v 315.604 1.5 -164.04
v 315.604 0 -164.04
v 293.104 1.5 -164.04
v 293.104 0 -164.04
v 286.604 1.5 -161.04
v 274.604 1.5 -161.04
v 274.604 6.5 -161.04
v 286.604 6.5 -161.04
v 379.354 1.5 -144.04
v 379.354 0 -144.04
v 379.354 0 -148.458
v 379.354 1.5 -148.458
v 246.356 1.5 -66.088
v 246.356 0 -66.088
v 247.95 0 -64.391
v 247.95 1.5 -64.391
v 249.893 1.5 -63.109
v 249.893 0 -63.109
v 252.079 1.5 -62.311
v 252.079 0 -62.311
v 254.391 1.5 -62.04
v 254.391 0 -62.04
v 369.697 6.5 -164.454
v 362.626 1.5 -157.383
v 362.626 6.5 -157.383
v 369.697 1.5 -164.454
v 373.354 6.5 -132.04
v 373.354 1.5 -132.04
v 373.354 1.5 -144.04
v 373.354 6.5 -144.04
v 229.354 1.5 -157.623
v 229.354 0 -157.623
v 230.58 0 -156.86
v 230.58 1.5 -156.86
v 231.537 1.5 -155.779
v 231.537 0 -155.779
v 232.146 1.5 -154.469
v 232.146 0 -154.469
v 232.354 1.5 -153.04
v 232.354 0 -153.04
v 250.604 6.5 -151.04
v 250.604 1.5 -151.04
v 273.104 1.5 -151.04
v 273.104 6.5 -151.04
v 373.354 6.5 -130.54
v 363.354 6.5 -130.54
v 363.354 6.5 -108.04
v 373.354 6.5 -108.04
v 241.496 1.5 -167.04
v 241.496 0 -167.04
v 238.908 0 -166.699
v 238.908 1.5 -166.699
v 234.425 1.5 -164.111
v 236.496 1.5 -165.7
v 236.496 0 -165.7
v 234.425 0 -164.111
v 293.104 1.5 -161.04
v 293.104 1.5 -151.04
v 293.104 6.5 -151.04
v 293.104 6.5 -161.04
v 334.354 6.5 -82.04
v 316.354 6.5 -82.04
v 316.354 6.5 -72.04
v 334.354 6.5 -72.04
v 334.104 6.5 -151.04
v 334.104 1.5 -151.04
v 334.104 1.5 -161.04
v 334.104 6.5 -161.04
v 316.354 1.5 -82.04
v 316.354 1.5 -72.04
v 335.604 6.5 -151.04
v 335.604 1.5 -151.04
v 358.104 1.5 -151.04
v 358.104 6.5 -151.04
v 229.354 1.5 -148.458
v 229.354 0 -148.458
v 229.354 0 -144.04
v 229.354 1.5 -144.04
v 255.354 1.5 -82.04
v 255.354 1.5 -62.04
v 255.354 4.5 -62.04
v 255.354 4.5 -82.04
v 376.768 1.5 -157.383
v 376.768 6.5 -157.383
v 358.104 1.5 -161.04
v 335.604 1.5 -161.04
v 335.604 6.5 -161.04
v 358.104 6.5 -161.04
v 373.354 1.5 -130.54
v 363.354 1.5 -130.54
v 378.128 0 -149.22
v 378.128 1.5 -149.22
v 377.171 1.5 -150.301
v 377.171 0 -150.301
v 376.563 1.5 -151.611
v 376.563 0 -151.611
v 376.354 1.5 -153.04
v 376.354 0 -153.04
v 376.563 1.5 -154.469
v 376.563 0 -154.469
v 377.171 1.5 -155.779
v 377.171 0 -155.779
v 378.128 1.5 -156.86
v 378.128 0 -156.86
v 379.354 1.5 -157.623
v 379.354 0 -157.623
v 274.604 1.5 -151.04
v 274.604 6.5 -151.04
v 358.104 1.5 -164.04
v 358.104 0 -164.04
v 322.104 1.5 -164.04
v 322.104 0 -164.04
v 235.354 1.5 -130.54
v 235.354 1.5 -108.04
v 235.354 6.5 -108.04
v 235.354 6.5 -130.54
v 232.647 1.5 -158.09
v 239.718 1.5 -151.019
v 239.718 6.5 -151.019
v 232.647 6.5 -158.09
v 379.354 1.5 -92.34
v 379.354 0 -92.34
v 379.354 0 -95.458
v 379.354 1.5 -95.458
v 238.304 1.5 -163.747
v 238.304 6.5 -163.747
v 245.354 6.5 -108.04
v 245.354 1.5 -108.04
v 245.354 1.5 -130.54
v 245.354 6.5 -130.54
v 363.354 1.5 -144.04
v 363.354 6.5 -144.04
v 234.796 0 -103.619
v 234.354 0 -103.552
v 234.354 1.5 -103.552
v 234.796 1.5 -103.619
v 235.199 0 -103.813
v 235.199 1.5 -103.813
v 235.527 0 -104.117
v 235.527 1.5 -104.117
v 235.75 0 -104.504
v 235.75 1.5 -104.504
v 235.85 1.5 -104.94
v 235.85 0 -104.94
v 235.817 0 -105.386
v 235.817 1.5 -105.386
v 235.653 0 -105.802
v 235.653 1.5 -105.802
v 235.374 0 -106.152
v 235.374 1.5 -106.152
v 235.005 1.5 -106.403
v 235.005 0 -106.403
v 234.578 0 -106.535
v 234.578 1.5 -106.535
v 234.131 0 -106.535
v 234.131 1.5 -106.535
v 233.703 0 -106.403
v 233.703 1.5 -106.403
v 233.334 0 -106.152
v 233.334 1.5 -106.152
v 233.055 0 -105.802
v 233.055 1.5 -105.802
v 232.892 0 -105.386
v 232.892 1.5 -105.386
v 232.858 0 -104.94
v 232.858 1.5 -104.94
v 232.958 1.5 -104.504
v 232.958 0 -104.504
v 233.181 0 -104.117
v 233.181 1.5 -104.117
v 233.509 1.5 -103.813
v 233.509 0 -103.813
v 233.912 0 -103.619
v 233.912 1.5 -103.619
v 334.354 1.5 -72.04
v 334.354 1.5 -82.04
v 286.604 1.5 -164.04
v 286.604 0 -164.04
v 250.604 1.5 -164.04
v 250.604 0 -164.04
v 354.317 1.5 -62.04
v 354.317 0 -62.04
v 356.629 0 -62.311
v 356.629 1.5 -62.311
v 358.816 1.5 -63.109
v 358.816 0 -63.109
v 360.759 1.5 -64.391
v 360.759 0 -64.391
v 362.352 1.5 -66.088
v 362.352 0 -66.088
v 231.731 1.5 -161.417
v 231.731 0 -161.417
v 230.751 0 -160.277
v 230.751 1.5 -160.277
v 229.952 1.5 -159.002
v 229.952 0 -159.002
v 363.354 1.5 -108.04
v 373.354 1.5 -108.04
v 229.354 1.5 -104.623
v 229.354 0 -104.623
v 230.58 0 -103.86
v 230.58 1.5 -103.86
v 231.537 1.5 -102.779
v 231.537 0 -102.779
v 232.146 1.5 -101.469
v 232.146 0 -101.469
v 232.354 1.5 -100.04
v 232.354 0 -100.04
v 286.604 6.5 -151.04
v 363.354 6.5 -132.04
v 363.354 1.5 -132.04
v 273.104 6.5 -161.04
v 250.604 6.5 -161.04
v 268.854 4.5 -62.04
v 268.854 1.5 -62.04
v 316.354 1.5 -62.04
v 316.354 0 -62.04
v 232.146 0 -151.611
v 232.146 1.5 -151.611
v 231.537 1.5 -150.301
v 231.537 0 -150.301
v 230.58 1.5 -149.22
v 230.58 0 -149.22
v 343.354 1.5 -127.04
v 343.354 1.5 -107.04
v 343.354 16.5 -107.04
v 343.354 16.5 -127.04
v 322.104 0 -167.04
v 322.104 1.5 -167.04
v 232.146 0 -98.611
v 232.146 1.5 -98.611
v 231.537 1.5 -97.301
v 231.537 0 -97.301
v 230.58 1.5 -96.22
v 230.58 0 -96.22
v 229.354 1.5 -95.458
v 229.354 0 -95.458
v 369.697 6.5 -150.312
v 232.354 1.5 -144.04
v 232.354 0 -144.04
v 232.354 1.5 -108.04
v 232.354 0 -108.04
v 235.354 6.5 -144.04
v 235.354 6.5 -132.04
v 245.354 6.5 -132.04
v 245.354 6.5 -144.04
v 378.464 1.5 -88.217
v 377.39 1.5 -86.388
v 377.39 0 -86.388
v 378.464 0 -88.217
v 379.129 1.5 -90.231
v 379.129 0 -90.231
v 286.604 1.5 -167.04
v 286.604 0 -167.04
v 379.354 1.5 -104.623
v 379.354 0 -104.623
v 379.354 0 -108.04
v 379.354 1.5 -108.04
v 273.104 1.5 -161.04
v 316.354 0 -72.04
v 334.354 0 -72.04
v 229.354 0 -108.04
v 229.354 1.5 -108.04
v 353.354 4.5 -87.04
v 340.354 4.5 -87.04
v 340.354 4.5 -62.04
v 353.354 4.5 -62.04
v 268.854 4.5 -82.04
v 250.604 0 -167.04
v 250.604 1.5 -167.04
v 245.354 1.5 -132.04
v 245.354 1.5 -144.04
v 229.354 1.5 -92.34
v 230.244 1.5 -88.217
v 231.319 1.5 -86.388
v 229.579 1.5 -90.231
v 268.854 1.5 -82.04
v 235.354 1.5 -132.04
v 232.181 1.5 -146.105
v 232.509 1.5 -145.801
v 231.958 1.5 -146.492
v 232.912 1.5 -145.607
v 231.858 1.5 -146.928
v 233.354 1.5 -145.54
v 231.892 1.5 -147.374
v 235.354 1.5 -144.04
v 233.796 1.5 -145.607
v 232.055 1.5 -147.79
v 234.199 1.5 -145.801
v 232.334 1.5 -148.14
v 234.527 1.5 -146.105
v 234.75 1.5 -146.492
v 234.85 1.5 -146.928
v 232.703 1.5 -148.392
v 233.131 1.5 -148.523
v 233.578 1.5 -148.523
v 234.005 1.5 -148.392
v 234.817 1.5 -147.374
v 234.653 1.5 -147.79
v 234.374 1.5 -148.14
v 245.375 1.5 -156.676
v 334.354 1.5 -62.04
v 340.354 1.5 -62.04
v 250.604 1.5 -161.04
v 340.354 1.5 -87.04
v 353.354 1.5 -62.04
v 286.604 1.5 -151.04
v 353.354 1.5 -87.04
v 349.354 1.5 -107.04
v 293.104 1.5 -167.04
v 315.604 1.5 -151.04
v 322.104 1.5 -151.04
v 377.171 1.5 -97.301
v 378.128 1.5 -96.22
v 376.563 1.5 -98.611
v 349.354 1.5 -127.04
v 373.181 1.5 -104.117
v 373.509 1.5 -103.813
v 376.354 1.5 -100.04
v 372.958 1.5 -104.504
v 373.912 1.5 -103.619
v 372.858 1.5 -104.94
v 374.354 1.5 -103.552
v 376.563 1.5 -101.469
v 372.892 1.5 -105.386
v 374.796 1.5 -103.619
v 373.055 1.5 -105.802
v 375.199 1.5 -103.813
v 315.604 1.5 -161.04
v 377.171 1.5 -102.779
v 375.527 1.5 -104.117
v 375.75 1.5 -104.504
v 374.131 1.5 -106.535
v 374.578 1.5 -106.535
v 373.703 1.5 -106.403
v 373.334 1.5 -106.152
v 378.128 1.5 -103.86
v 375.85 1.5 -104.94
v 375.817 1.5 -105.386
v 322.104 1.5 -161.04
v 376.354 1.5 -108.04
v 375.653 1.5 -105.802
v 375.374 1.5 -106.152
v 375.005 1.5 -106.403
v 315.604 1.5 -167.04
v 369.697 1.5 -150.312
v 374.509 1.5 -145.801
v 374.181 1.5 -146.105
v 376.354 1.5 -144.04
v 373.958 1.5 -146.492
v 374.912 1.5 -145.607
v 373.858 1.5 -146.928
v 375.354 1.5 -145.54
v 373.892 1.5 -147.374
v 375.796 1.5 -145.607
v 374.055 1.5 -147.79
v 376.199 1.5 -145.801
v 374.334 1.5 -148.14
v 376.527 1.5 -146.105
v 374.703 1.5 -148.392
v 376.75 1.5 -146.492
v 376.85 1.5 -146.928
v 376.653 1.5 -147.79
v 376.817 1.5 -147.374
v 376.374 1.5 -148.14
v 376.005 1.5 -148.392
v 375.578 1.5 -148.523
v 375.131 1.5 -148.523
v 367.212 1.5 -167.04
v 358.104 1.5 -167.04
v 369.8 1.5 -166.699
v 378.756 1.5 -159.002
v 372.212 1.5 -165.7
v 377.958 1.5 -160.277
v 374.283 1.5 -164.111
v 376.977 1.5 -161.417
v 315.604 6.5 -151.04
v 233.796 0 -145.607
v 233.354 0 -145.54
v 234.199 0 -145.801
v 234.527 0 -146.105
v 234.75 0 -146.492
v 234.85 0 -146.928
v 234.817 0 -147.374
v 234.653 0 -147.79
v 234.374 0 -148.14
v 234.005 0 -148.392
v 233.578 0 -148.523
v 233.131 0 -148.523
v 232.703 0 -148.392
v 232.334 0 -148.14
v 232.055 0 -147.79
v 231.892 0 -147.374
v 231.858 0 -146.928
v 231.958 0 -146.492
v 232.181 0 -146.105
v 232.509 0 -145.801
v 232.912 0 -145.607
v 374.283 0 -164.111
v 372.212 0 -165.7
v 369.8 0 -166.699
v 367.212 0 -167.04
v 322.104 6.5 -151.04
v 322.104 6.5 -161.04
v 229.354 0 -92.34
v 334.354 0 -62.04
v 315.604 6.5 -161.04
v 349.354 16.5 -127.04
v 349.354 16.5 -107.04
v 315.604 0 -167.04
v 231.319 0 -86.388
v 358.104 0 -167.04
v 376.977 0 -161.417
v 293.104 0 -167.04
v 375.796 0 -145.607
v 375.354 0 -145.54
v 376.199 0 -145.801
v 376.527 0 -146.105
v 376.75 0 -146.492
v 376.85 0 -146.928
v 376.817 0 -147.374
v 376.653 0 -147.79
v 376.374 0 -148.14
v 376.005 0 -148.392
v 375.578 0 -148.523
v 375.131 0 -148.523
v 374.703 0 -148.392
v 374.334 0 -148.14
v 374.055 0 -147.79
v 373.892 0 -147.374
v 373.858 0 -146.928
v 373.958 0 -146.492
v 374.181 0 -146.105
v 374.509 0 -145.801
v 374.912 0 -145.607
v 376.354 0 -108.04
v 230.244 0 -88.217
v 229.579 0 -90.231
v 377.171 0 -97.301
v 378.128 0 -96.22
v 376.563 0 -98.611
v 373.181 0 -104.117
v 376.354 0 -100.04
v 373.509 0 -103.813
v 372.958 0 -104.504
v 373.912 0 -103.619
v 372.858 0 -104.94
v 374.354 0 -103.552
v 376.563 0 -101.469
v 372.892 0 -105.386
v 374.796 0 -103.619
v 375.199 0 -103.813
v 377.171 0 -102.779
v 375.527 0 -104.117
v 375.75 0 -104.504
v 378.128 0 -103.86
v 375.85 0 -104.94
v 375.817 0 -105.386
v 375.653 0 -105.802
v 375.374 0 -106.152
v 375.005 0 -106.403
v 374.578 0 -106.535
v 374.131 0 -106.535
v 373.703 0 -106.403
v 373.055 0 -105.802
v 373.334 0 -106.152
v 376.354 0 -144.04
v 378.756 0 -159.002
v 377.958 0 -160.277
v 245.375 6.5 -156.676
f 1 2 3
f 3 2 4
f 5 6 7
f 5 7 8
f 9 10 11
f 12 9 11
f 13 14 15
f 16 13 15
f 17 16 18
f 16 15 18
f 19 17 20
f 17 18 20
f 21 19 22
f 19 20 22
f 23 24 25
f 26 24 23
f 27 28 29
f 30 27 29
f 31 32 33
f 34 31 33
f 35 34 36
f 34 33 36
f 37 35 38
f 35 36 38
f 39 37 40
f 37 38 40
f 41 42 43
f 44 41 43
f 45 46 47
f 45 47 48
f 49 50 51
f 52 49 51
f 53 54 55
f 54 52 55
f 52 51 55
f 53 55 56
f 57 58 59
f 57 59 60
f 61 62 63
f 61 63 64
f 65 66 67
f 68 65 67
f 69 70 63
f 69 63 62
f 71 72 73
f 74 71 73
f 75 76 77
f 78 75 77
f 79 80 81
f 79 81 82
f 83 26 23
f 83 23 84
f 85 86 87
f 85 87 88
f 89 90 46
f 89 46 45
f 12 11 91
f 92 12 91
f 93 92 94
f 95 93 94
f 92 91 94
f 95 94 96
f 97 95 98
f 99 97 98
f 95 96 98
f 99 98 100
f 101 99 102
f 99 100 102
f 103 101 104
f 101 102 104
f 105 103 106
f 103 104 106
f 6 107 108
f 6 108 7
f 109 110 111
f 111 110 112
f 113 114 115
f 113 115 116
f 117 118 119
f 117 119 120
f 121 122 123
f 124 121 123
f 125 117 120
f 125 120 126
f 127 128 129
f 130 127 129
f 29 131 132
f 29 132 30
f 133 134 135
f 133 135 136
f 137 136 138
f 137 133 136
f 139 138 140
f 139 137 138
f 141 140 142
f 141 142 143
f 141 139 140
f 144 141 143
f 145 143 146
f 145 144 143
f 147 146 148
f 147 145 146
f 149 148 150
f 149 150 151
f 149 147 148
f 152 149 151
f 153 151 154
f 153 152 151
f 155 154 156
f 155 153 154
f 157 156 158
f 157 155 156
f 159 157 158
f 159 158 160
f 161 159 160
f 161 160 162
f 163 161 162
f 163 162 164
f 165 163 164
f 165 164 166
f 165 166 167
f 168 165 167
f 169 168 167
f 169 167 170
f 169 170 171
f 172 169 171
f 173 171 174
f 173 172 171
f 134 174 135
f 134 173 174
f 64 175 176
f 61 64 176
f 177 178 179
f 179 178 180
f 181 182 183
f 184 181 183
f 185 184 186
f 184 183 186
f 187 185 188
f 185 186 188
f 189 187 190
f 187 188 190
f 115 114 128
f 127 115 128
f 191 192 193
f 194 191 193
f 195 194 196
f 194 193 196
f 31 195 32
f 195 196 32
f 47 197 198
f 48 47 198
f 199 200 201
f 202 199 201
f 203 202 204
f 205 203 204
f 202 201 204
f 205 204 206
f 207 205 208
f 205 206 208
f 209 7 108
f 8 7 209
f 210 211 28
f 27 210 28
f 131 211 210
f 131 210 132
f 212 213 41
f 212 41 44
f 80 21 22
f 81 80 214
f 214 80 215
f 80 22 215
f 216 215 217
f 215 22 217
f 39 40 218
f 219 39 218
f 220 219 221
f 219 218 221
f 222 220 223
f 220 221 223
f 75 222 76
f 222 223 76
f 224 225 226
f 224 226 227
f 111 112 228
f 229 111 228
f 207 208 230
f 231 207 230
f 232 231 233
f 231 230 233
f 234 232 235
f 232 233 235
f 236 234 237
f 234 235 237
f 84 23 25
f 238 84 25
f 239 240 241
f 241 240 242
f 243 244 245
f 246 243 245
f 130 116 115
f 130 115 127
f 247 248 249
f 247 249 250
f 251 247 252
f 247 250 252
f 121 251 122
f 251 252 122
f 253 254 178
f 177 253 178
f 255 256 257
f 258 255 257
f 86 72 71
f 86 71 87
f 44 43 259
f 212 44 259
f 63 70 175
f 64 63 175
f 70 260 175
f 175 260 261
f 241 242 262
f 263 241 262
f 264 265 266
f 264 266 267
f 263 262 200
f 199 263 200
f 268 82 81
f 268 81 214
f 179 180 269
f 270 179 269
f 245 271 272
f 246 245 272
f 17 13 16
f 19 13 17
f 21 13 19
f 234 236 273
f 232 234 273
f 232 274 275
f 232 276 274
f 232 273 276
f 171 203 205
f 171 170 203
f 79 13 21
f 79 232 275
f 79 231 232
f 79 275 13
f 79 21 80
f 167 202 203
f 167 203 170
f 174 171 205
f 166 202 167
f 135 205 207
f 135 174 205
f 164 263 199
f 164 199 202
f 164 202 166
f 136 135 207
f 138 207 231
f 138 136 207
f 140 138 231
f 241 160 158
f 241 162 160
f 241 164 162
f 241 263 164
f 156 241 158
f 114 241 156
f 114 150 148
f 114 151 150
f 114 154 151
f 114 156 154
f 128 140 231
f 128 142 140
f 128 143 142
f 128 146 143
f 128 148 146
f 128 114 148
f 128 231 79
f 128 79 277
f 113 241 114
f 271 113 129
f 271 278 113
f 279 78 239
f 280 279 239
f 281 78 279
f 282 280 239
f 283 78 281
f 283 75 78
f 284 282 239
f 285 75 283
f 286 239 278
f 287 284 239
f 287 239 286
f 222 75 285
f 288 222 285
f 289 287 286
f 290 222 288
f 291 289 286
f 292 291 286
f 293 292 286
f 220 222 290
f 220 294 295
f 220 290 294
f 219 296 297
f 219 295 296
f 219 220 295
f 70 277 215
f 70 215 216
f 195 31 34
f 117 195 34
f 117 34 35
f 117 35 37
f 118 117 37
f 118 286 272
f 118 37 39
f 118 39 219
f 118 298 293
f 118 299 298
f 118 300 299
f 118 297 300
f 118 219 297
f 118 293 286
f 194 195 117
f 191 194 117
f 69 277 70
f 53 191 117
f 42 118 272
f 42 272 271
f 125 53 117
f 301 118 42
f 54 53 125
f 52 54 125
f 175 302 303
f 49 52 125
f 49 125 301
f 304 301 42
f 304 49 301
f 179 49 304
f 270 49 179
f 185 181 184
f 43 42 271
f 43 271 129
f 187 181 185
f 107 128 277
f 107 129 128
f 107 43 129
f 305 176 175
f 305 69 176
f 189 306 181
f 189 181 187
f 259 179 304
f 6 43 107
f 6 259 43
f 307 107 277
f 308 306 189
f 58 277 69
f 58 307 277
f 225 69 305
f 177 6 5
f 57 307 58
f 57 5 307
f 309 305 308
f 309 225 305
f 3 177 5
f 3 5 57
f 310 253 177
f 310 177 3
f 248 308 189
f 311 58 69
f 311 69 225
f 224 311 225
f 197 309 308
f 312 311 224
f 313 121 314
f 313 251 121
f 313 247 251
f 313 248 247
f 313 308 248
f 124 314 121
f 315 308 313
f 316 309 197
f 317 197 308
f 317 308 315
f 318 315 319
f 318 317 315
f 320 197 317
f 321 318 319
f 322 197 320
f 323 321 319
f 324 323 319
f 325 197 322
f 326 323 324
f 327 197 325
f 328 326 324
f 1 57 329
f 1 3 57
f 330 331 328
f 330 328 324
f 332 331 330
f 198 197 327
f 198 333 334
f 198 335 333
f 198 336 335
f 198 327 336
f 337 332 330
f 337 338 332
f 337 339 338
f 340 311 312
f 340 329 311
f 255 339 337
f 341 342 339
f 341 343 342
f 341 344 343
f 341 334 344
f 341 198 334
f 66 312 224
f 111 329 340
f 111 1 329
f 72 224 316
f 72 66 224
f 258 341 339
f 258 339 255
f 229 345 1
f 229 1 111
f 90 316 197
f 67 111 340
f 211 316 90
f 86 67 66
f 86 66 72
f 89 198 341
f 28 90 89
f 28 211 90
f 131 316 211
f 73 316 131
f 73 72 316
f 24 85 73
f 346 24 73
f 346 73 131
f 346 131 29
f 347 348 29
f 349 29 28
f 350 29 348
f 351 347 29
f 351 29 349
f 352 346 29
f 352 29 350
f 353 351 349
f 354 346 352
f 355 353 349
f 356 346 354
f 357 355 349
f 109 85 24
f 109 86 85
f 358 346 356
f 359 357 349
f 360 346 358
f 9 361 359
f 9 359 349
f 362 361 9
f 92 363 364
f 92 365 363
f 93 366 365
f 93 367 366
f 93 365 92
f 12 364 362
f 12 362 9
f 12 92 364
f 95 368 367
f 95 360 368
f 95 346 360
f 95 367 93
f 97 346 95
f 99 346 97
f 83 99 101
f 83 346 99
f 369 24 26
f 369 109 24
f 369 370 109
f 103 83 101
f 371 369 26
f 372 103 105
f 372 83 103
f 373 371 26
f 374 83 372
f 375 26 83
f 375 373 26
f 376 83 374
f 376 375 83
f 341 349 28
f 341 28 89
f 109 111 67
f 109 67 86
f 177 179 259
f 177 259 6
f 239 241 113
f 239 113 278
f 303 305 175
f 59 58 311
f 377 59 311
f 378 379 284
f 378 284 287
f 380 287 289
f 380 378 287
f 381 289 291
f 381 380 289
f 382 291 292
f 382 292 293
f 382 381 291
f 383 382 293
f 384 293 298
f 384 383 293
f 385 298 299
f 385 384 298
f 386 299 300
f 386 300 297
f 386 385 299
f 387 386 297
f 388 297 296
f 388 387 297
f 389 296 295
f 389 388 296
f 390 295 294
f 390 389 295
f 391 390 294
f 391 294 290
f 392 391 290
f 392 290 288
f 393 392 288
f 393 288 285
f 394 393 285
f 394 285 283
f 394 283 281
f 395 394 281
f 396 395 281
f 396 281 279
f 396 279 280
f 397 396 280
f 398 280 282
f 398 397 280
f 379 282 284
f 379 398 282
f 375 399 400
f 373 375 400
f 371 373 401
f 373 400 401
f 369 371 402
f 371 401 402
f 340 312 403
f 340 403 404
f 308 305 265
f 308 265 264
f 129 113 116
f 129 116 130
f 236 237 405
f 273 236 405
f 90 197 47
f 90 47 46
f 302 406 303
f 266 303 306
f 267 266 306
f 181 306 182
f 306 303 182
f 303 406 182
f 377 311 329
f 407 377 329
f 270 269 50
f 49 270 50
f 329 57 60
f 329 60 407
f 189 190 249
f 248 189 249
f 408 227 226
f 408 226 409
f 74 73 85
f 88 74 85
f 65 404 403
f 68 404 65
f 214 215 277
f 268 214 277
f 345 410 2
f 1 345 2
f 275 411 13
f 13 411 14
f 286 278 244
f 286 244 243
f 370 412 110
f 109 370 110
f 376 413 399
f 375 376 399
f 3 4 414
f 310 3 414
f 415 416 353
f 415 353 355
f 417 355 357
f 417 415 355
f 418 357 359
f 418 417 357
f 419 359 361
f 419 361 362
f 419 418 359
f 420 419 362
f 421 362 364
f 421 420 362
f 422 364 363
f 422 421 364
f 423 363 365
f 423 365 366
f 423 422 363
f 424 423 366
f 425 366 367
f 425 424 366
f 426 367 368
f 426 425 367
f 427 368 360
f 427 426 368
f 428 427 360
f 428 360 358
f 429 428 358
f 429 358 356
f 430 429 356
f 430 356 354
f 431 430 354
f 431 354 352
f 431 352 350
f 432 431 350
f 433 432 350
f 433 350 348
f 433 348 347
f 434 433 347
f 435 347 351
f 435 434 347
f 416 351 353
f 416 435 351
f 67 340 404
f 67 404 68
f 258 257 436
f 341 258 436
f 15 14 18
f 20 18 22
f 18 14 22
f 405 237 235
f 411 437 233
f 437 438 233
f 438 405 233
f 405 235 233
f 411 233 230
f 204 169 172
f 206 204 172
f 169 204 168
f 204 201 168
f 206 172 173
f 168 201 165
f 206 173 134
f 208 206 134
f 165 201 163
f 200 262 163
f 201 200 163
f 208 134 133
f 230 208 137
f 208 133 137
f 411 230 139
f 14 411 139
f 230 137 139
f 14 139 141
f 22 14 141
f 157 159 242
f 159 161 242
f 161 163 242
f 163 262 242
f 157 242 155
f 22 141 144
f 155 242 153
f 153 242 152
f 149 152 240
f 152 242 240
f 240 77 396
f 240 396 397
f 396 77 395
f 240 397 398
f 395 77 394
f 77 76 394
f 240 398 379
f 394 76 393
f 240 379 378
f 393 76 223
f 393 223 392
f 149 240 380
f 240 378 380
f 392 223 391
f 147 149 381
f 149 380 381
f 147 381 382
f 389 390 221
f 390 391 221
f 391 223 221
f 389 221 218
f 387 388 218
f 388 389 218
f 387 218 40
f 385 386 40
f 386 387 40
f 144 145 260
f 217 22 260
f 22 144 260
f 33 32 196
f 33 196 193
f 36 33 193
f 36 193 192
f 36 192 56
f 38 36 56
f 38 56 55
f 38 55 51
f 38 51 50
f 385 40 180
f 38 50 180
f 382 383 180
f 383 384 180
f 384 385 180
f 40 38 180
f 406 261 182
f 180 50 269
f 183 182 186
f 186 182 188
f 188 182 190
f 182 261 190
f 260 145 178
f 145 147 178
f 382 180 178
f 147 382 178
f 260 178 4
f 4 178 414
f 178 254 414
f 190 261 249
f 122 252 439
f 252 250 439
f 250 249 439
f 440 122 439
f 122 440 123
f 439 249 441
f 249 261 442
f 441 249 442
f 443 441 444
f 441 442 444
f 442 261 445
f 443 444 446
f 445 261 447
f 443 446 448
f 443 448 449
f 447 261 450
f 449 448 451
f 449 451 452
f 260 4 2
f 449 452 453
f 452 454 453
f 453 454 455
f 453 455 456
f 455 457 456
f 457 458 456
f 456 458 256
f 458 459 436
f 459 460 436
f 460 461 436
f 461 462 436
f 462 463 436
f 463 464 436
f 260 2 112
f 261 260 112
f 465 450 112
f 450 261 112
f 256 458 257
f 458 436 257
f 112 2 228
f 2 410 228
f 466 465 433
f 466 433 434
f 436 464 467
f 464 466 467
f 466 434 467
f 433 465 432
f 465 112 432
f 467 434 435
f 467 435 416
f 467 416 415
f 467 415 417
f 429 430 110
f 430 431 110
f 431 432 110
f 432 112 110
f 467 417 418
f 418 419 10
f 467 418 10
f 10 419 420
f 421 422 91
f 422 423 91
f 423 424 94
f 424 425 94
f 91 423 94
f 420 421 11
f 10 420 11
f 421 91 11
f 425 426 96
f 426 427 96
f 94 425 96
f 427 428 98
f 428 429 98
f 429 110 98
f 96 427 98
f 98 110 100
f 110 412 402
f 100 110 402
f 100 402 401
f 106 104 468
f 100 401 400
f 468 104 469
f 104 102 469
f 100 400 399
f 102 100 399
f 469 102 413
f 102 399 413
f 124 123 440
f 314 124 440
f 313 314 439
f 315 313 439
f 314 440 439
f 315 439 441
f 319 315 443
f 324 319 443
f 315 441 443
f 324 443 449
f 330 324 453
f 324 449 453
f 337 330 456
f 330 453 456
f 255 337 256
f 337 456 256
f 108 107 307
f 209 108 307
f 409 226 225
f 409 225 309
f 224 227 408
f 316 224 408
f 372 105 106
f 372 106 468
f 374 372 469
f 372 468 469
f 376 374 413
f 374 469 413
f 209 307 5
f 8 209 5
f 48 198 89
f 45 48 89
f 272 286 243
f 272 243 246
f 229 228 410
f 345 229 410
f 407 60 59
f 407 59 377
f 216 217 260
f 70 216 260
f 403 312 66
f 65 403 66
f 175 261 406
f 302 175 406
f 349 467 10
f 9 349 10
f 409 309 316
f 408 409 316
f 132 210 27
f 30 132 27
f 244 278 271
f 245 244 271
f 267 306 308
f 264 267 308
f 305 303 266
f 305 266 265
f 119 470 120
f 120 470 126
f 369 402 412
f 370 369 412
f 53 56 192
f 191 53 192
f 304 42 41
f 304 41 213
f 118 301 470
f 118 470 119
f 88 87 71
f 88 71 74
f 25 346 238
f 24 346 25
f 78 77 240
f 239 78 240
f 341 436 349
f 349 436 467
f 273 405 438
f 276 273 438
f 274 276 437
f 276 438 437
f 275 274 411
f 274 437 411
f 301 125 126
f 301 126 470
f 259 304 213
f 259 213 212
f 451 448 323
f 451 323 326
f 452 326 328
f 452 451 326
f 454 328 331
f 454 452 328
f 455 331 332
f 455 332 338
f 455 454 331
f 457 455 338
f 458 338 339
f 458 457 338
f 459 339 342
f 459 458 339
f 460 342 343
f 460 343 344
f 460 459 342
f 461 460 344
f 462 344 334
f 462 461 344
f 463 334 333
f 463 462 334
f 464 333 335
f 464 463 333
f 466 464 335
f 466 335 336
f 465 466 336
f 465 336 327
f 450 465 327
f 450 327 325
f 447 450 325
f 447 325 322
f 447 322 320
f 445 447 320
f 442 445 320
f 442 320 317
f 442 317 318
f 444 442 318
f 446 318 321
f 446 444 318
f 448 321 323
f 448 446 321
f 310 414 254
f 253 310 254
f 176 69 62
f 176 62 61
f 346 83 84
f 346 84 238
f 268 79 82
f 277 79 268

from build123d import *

# Parameters (mm, degrees)
SKETCH_2_R      = 1.5
EXTRUDE_1_DEPTH = 1.5
SKETCH_3_W      = 22.5
SKETCH_3_H      = 10
SKETCH_3_W_2    = 12
SKETCH_3_W_3    = 10
SKETCH_3_H_2    = 12
SKETCH_3_H_3    = 22.5
SKETCH_3_W_4    = 18
EXTRUDE_2_DEPTH = 5
SKETCH_4_W      = 6
SKETCH_4_H      = 20
EXTRUDE_3_DEPTH = 15
FILLET_1_R      = 10
SKETCH_6_W      = 13.5
SKETCH_6_H      = 20
SKETCH_6_W_2    = 13
SKETCH_6_H_2    = 25
EXTRUDE_5_DEPTH = 3


with BuildPart() as part:
    # 草图2 → 凸台-拉伸1 (new body)
    # profile 1 of 3: a face of its own
    with BuildSketch(Plane(origin=(0, 0, 0), x_dir=(1, 0, 0), z_dir=(0, 1, 0))):
        with BuildLine():
            Line((250.604175692, 167.040097328), (237.354175692, 167.040097328))
            Line((237.354175692, 167.040097328), (229.354175692, 159.040097328))
            Line((229.354175692, 159.040097328), (229.354175692, 157.622673023))
            ThreePointArc((229.354175692, 157.622673023), (231.537475825, 155.778710115), (232.354175692, 153.040097328))
            ThreePointArc((232.354175692, 153.040097328), (231.537475825, 150.30148454), (229.354175692, 148.457521633))
            Line((229.354175692, 148.457521633), (229.354175692, 144.040097328))
            Line((229.354175692, 144.040097328), (232.354175692, 144.040097328))
            Line((232.354175692, 144.040097328), (232.354175692, 108.040097328))
            Line((232.354175692, 108.040097328), (229.354175692, 108.040097328))
            Line((229.354175692, 108.040097328), (229.354175692, 104.622673023))
            ThreePointArc((229.354175692, 104.622673023), (231.537475825, 102.778710115), (232.354175692, 100.040097328))
            ThreePointArc((232.354175692, 100.040097328), (231.537475825, 97.30148454), (229.354175692, 95.457521633))
            Line((229.354175692, 95.457521633), (229.354175692, 89.040097328))
            Line((229.354175692, 89.040097328), (248.966003356, 62.564129981))
            ThreePointArc((248.966003356, 62.564129981), (249.273338447, 62.30138118), (249.581919942, 62.040097328))
            Line((249.581919942, 62.040097328), (316.354175692, 62.040097328))
            Line((316.354175692, 62.040097328), (316.354175692, 72.040097328))
            Line((316.354175692, 72.040097328), (334.354175692, 72.040097328))
            Line((334.354175692, 72.040097328), (334.354175692, 62.040097328))
            Line((334.354175692, 62.040097328), (359.126431443, 62.040097328))
            ThreePointArc((359.126431443, 62.040097328), (359.435012937, 62.30138118), (359.742348028, 62.564129981))
            Line((359.742348028, 62.564129981), (379.354175692, 89.040097328))
            Line((379.354175692, 89.040097328), (379.354175692, 95.457521633))
            ThreePointArc((379.354175692, 95.457521633), (376.354175692, 100.040097328), (379.354175692, 104.622673023))
            Line((379.354175692, 104.622673023), (379.354175692, 108.040097328))
            Line((379.354175692, 108.040097328), (376.354175692, 108.040097328))
            Line((376.354175692, 108.040097328), (376.354175692, 144.040097328))
            Line((376.354175692, 144.040097328), (379.354175692, 144.040097328))
            Line((379.354175692, 144.040097328), (379.354175692, 148.457521633))
            ThreePointArc((379.354175692, 148.457521633), (376.354175692, 153.040097328), (379.354175692, 157.622673023))
            Line((379.354175692, 157.622673023), (379.354175692, 159.040097328))
            Line((379.354175692, 159.040097328), (371.354175692, 167.040097328))
            Line((371.354175692, 167.040097328), (358.104175692, 167.040097328))
            Line((358.104175692, 167.040097328), (358.104175692, 164.040097328))
            Line((358.104175692, 164.040097328), (322.104175692, 164.040097328))
            Line((322.104175692, 164.040097328), (322.104175692, 167.040097328))
            Line((322.104175692, 167.040097328), (315.604175692, 167.040097328))
            Line((315.604175692, 167.040097328), (315.604175692, 164.040097328))
            Line((315.604175692, 164.040097328), (293.104175692, 164.040097328))
            Line((293.104175692, 164.040097328), (293.104175692, 167.040097328))
            Line((293.104175692, 167.040097328), (286.604175692, 167.040097328))
            Line((286.604175692, 167.040097328), (286.604175692, 164.040097328))
            Line((286.604175692, 164.040097328), (250.604175692, 164.040097328))
            Line((250.604175692, 164.040097328), (250.604175692, 167.040097328))
        make_face()
        with Locations(Location((234.354175692, 105.052003777, 0), (0, 0, 270))):
            Circle(SKETCH_2_R, mode=Mode.SUBTRACT)
        with Locations(Location((374.354175692, 105.052003777, 0), (0, 0, 270))):
            Circle(SKETCH_2_R, mode=Mode.SUBTRACT)
        with Locations(Location((233.354175692, 147.040097328, 0), (0, 0, 270))):
            Circle(SKETCH_2_R, mode=Mode.SUBTRACT)
        with Locations(Location((375.354175692, 147.040097328, 0), (0, 0, 270))):
            Circle(SKETCH_2_R, mode=Mode.SUBTRACT)
    # profile 2 of 3: a face of its own
    with BuildSketch(Plane(origin=(0, 0, 0), x_dir=(1, 0, 0), z_dir=(0, 1, 0))):
        with BuildLine():
            ThreePointArc((249.581919942, 62.040097328), (249.273338447, 62.30138118), (248.966003356, 62.564129981))
            Line((248.966003356, 62.564129981), (249.354175692, 62.040097328))
            Line((249.354175692, 62.040097328), (249.581919942, 62.040097328))
        make_face()
    # profile 3 of 3: a face of its own
    with BuildSketch(Plane(origin=(0, 0, 0), x_dir=(1, 0, 0), z_dir=(0, 1, 0))):
        with BuildLine():
            ThreePointArc((359.742348028, 62.564129981), (359.435012937, 62.30138118), (359.126431443, 62.040097328))
            Line((359.126431443, 62.040097328), (359.354175692, 62.040097328))
            Line((359.354175692, 62.040097328), (359.742348028, 62.564129981))
        make_face()
    extrude(amount=EXTRUDE_1_DEPTH)

    # 草图3 → 凸台-拉伸2 (add)
    with BuildSketch(Plane(origin=(0, 1.5, 0), x_dir=(1, 0, 0), z_dir=(0, 1, 0))):
        with Locations((261.854175692, 156.040097328)):
            Rectangle(SKETCH_3_W, SKETCH_3_H)
        with Locations((280.604175692, 156.040097328)):
            Rectangle(SKETCH_3_W_2, SKETCH_3_H)
        with Locations((304.354175692, 156.040097328)):
            Rectangle(SKETCH_3_W, SKETCH_3_H)
        with Locations((328.104175692, 156.040097328)):
            Rectangle(SKETCH_3_W_2, SKETCH_3_H)
        with Locations((346.854175692, 156.040097328)):
            Rectangle(SKETCH_3_W, SKETCH_3_H)
        with Locations((368.354175692, 138.040097328)):
            Rectangle(SKETCH_3_W_3, SKETCH_3_H_2)
        with Locations((368.354175692, 119.290097328)):
            Rectangle(SKETCH_3_W_3, SKETCH_3_H_3)
        with Locations((240.354175692, 138.040097328)):
            Rectangle(SKETCH_3_W_3, SKETCH_3_H_2)
        with Locations((240.354175692, 119.290097328)):
            Rectangle(SKETCH_3_W_3, SKETCH_3_H_3)
        Polygon((232.647068911, 158.090349859), (238.30392316, 163.747204109), (245.374990972, 156.676136297), (239.718136723, 151.019282048), align=None)
        Polygon((369.697321443, 164.45431089), (376.768389254, 157.383243078), (369.697321443, 150.312175266), (362.626253631, 157.383243078), align=None)
        with Locations((325.354175692, 77.040097328)):
            Rectangle(SKETCH_3_W_4, SKETCH_3_H)
    extrude(amount=EXTRUDE_2_DEPTH)

    # 草图4 → 凸台-拉伸3 (add)
    with BuildSketch(Plane(origin=(0, 1.5, 0), x_dir=(1, 0, 0), z_dir=(0, 1, 0))):
        with Locations((346.354175692, 117.040097328)):
            Rectangle(SKETCH_4_W, SKETCH_4_H)
    extrude(amount=EXTRUDE_3_DEPTH)

    # 圆角1
    # the kernel refuses this fillet: 10 mm, written as the material it takes off along each edge
    with BuildSketch(Plane(origin=(229.354175692, -8.403282896, -159.040097328), x_dir=(0.7071067811865475, 0, -0.7071067811865475), z_dir=(0, 1, 0))) as fillet_1_piece_1:
        with BuildLine():
            CenterArc((3.361313158, -10), FILLET_1_R, 90, 25.871759313)
            Line((-1.002270338, -1.002270338), (-1.089542008, -0.822315745))
            ThreePointArc((-1.089542008, -0.822315745), (-0.642556525, -0.359713813), (-0.141421356, 0.141421356))
            Line((-0.141421356, 0.141421356), (0, 0.2))
            Line((0, 0.2), (3.361313158, 0.2))
            Line((3.361313158, 0.2), (3.361313158, 0))
        make_face()
    extrude(amount=18.306565791, mode=Mode.SUBTRACT)
    with BuildSketch(Plane(origin=(237.354175692, -10.355339059, -167.040097328), x_dir=(1, 0, 0), z_dir=(0, 1, 0)), Plane(origin=(371.354175692, -10.355339059, -167.040097328), x_dir=(0.707106781186544, 0, 0.7071067811865509), z_dir=(0, 1, 0))) as fillet_1_piece_2:
        with BuildLine():
            CenterArc((FILLET_1_R * 0.414213562373, -FILLET_1_R), FILLET_1_R, 90, 45)
            Line((-FILLET_1_R * 0.292893218813, -FILLET_1_R * 0.292893218813), (-FILLET_1_R * 0.307035354437, -FILLET_1_R * 0.27875108319))
            Line((-FILLET_1_R * 0.307035354437, -FILLET_1_R * 0.27875108319), (-FILLET_1_R * 0.00828427124746, FILLET_1_R * 0.02))
            Line((-FILLET_1_R * 0.00828427124746, FILLET_1_R * 0.02), (FILLET_1_R * 0.414213562373, FILLET_1_R * 0.02))
            Line((FILLET_1_R * 0.414213562373, FILLET_1_R * 0.02), (FILLET_1_R * 0.414213562373, 0))
        make_face()
    extrude(amount=22.210678119, mode=Mode.SUBTRACT)
    with BuildSketch(Plane(origin=(379.354175692, -8.403282896, -159.040097328), x_dir=(0, 0, 1), z_dir=(0, 1, 0))) as fillet_1_piece_3:
        with BuildLine():
            CenterArc((4.694260484, -9.44787514), FILLET_1_R, 109.128240687, 25.871759313)
            Line((-2.376807328, -2.376807328), (-2.518228684, -2.235385972))
            Line((-2.518228684, -2.235385972), (-0.141421356, 0.141421356))
            Line((-0.141421356, 0.141421356), (0, 0.2))
            ThreePointArc((0, 0.2), (0.708712153, 0.2), (1.351887581, 0.188957503))
            Line((1.351887581, 0.188957503), (1.417424305, 0))
        make_face()
    extrude(amount=18.306565791, mode=Mode.SUBTRACT)
    with BuildSketch(Plane(origin=(379.354175692, -8.250744041, -89.040097328), x_dir=(0, 0, -1), z_dir=(0, 1, 0))) as fillet_1_piece_4:
        with BuildLine():
            CenterArc((FILLET_1_R * 0.330029761641, FILLET_1_R), FILLET_1_R, 233.471144633, 36.528855367)
            Line((-FILLET_1_R * 0.265197788985, FILLET_1_R * 0.196442806655), (-FILLET_1_R * 0.277102339997, FILLET_1_R * 0.180371662788))
            Line((-FILLET_1_R * 0.277102339997, FILLET_1_R * 0.180371662788), (-FILLET_1_R * 0.00660059523282, -FILLET_1_R * 0.02))
            Line((-FILLET_1_R * 0.00660059523282, -FILLET_1_R * 0.02), (FILLET_1_R * 0.330029761641, -FILLET_1_R * 0.02))
            Line((FILLET_1_R * 0.330029761641, -FILLET_1_R * 0.02), (FILLET_1_R * 0.330029761641, 0))
        make_face()
    extrude(amount=18.001488082, mode=Mode.SUBTRACT)
    with BuildSketch(Plane(origin=(359.354175692, -12.593143734, -62.040097328), x_dir=(0.5952275506257363, 0, -0.8035571933447467), z_dir=(0, 1, 0))) as fillet_1_piece_5:
        with BuildLine():
            CenterArc((FILLET_1_R * 0.503725749364, FILLET_1_R), FILLET_1_R, 216.528855367, 53.471144633)
            Line((-FILLET_1_R * 0.299831443981, FILLET_1_R * 0.404772449374), (-FILLET_1_R * 0.315902587848, FILLET_1_R * 0.392867898362))
            Line((-FILLET_1_R * 0.315902587848, FILLET_1_R * 0.392867898362), (-FILLET_1_R * 0.0100745149873, -FILLET_1_R * 0.02))
            Line((-FILLET_1_R * 0.0100745149873, -FILLET_1_R * 0.02), (FILLET_1_R * 0.503725749364, -FILLET_1_R * 0.02))
            Line((FILLET_1_R * 0.503725749364, -FILLET_1_R * 0.02), (FILLET_1_R * 0.503725749364, 0))
        make_face()
    extrude(amount=26.686287468, mode=Mode.SUBTRACT)
    with BuildSketch(Plane(origin=(249.354175692, -12.593143734, -62.040097328), x_dir=(-0.5952275506257363, 0, -0.8035571933447467), z_dir=(0, 1, 0))) as fillet_1_piece_6:
        with BuildLine():
            CenterArc((FILLET_1_R * 0.503725749364, -FILLET_1_R), FILLET_1_R, 90, 53.471144633)
            Line((-FILLET_1_R * 0.299831443981, -FILLET_1_R * 0.404772449374), (-FILLET_1_R * 0.315902587848, -FILLET_1_R * 0.392867898362))
            Line((-FILLET_1_R * 0.315902587848, -FILLET_1_R * 0.392867898362), (-FILLET_1_R * 0.0100745149873, FILLET_1_R * 0.02))
            Line((-FILLET_1_R * 0.0100745149873, FILLET_1_R * 0.02), (FILLET_1_R * 0.503725749364, FILLET_1_R * 0.02))
            Line((FILLET_1_R * 0.503725749364, FILLET_1_R * 0.02), (FILLET_1_R * 0.503725749364, 0))
        make_face()
    extrude(amount=26.686287468, mode=Mode.SUBTRACT)
    with BuildSketch(Plane(origin=(229.354175692, -8.250744041, -89.040097328), x_dir=(0, 0, -1), z_dir=(0, 1, 0))) as fillet_1_piece_7:
        with BuildLine():
            CenterArc((FILLET_1_R * 0.330029761641, -FILLET_1_R), FILLET_1_R, 90, 36.528855367)
            Line((-FILLET_1_R * 0.265197788985, -FILLET_1_R * 0.196442806655), (-FILLET_1_R * 0.277102339997, -FILLET_1_R * 0.180371662788))
            Line((-FILLET_1_R * 0.277102339997, -FILLET_1_R * 0.180371662788), (-FILLET_1_R * 0.00660059523282, FILLET_1_R * 0.02))
            Line((-FILLET_1_R * 0.00660059523282, FILLET_1_R * 0.02), (FILLET_1_R * 0.330029761641, FILLET_1_R * 0.02))
            Line((FILLET_1_R * 0.330029761641, FILLET_1_R * 0.02), (FILLET_1_R * 0.330029761641, 0))
        make_face()
    extrude(amount=18.001488082, mode=Mode.SUBTRACT)

    # 草图6 → 凸台-拉伸5 (add)
    with BuildSketch(Plane(origin=(0, 1.5, 0), x_dir=(1, 0, 0), z_dir=(0, 1, 0))):
        with Locations((262.104175692, 72.040097328)):
            Rectangle(SKETCH_6_W, SKETCH_6_H)
        with Locations((346.854175692, 74.540097328)):
            Rectangle(SKETCH_6_W_2, SKETCH_6_H_2)
    extrude(amount=EXTRUDE_5_DEPTH)


solid = part.part
